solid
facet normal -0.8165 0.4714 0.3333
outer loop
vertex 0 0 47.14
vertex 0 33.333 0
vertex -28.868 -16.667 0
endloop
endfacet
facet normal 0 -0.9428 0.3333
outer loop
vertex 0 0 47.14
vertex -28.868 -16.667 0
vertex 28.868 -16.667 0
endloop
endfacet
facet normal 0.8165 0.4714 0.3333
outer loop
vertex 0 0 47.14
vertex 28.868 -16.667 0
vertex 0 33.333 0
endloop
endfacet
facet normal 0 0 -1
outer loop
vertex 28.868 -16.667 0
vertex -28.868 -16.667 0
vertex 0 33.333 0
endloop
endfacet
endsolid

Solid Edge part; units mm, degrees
sketch "Sketch1" plane through (0, 0, 0) normal (0, 0, 1) x (1, 0, 0)
  line L0 (-28.8675, -16.6667) -> (28.8675, -16.6667)
  line L1 (28.8675, -16.6667) -> (0, 33.3333)
  line L2 (0, 33.3333) -> (-28.8675, -16.6667)
extrude "Protrusion1" add sketch "Sketch1" along normal blind 113.4955
sketch "Sketch2" plane through (0, 0, 0) normal (1, 0, 0) x (0, 1, 0)
  line L0 (-16.6667, 0) -> (0, 47.1405)
extrude "Cutout1" cut sketch "Sketch2" along normal up to next and the other way up to next material side at (0, -8.3805, 23.5869)
pattern_circular "Pattern1" count 3 over 360 about axis through (0, 0, 0) along (0, 0, 1) of "Cutout1"
